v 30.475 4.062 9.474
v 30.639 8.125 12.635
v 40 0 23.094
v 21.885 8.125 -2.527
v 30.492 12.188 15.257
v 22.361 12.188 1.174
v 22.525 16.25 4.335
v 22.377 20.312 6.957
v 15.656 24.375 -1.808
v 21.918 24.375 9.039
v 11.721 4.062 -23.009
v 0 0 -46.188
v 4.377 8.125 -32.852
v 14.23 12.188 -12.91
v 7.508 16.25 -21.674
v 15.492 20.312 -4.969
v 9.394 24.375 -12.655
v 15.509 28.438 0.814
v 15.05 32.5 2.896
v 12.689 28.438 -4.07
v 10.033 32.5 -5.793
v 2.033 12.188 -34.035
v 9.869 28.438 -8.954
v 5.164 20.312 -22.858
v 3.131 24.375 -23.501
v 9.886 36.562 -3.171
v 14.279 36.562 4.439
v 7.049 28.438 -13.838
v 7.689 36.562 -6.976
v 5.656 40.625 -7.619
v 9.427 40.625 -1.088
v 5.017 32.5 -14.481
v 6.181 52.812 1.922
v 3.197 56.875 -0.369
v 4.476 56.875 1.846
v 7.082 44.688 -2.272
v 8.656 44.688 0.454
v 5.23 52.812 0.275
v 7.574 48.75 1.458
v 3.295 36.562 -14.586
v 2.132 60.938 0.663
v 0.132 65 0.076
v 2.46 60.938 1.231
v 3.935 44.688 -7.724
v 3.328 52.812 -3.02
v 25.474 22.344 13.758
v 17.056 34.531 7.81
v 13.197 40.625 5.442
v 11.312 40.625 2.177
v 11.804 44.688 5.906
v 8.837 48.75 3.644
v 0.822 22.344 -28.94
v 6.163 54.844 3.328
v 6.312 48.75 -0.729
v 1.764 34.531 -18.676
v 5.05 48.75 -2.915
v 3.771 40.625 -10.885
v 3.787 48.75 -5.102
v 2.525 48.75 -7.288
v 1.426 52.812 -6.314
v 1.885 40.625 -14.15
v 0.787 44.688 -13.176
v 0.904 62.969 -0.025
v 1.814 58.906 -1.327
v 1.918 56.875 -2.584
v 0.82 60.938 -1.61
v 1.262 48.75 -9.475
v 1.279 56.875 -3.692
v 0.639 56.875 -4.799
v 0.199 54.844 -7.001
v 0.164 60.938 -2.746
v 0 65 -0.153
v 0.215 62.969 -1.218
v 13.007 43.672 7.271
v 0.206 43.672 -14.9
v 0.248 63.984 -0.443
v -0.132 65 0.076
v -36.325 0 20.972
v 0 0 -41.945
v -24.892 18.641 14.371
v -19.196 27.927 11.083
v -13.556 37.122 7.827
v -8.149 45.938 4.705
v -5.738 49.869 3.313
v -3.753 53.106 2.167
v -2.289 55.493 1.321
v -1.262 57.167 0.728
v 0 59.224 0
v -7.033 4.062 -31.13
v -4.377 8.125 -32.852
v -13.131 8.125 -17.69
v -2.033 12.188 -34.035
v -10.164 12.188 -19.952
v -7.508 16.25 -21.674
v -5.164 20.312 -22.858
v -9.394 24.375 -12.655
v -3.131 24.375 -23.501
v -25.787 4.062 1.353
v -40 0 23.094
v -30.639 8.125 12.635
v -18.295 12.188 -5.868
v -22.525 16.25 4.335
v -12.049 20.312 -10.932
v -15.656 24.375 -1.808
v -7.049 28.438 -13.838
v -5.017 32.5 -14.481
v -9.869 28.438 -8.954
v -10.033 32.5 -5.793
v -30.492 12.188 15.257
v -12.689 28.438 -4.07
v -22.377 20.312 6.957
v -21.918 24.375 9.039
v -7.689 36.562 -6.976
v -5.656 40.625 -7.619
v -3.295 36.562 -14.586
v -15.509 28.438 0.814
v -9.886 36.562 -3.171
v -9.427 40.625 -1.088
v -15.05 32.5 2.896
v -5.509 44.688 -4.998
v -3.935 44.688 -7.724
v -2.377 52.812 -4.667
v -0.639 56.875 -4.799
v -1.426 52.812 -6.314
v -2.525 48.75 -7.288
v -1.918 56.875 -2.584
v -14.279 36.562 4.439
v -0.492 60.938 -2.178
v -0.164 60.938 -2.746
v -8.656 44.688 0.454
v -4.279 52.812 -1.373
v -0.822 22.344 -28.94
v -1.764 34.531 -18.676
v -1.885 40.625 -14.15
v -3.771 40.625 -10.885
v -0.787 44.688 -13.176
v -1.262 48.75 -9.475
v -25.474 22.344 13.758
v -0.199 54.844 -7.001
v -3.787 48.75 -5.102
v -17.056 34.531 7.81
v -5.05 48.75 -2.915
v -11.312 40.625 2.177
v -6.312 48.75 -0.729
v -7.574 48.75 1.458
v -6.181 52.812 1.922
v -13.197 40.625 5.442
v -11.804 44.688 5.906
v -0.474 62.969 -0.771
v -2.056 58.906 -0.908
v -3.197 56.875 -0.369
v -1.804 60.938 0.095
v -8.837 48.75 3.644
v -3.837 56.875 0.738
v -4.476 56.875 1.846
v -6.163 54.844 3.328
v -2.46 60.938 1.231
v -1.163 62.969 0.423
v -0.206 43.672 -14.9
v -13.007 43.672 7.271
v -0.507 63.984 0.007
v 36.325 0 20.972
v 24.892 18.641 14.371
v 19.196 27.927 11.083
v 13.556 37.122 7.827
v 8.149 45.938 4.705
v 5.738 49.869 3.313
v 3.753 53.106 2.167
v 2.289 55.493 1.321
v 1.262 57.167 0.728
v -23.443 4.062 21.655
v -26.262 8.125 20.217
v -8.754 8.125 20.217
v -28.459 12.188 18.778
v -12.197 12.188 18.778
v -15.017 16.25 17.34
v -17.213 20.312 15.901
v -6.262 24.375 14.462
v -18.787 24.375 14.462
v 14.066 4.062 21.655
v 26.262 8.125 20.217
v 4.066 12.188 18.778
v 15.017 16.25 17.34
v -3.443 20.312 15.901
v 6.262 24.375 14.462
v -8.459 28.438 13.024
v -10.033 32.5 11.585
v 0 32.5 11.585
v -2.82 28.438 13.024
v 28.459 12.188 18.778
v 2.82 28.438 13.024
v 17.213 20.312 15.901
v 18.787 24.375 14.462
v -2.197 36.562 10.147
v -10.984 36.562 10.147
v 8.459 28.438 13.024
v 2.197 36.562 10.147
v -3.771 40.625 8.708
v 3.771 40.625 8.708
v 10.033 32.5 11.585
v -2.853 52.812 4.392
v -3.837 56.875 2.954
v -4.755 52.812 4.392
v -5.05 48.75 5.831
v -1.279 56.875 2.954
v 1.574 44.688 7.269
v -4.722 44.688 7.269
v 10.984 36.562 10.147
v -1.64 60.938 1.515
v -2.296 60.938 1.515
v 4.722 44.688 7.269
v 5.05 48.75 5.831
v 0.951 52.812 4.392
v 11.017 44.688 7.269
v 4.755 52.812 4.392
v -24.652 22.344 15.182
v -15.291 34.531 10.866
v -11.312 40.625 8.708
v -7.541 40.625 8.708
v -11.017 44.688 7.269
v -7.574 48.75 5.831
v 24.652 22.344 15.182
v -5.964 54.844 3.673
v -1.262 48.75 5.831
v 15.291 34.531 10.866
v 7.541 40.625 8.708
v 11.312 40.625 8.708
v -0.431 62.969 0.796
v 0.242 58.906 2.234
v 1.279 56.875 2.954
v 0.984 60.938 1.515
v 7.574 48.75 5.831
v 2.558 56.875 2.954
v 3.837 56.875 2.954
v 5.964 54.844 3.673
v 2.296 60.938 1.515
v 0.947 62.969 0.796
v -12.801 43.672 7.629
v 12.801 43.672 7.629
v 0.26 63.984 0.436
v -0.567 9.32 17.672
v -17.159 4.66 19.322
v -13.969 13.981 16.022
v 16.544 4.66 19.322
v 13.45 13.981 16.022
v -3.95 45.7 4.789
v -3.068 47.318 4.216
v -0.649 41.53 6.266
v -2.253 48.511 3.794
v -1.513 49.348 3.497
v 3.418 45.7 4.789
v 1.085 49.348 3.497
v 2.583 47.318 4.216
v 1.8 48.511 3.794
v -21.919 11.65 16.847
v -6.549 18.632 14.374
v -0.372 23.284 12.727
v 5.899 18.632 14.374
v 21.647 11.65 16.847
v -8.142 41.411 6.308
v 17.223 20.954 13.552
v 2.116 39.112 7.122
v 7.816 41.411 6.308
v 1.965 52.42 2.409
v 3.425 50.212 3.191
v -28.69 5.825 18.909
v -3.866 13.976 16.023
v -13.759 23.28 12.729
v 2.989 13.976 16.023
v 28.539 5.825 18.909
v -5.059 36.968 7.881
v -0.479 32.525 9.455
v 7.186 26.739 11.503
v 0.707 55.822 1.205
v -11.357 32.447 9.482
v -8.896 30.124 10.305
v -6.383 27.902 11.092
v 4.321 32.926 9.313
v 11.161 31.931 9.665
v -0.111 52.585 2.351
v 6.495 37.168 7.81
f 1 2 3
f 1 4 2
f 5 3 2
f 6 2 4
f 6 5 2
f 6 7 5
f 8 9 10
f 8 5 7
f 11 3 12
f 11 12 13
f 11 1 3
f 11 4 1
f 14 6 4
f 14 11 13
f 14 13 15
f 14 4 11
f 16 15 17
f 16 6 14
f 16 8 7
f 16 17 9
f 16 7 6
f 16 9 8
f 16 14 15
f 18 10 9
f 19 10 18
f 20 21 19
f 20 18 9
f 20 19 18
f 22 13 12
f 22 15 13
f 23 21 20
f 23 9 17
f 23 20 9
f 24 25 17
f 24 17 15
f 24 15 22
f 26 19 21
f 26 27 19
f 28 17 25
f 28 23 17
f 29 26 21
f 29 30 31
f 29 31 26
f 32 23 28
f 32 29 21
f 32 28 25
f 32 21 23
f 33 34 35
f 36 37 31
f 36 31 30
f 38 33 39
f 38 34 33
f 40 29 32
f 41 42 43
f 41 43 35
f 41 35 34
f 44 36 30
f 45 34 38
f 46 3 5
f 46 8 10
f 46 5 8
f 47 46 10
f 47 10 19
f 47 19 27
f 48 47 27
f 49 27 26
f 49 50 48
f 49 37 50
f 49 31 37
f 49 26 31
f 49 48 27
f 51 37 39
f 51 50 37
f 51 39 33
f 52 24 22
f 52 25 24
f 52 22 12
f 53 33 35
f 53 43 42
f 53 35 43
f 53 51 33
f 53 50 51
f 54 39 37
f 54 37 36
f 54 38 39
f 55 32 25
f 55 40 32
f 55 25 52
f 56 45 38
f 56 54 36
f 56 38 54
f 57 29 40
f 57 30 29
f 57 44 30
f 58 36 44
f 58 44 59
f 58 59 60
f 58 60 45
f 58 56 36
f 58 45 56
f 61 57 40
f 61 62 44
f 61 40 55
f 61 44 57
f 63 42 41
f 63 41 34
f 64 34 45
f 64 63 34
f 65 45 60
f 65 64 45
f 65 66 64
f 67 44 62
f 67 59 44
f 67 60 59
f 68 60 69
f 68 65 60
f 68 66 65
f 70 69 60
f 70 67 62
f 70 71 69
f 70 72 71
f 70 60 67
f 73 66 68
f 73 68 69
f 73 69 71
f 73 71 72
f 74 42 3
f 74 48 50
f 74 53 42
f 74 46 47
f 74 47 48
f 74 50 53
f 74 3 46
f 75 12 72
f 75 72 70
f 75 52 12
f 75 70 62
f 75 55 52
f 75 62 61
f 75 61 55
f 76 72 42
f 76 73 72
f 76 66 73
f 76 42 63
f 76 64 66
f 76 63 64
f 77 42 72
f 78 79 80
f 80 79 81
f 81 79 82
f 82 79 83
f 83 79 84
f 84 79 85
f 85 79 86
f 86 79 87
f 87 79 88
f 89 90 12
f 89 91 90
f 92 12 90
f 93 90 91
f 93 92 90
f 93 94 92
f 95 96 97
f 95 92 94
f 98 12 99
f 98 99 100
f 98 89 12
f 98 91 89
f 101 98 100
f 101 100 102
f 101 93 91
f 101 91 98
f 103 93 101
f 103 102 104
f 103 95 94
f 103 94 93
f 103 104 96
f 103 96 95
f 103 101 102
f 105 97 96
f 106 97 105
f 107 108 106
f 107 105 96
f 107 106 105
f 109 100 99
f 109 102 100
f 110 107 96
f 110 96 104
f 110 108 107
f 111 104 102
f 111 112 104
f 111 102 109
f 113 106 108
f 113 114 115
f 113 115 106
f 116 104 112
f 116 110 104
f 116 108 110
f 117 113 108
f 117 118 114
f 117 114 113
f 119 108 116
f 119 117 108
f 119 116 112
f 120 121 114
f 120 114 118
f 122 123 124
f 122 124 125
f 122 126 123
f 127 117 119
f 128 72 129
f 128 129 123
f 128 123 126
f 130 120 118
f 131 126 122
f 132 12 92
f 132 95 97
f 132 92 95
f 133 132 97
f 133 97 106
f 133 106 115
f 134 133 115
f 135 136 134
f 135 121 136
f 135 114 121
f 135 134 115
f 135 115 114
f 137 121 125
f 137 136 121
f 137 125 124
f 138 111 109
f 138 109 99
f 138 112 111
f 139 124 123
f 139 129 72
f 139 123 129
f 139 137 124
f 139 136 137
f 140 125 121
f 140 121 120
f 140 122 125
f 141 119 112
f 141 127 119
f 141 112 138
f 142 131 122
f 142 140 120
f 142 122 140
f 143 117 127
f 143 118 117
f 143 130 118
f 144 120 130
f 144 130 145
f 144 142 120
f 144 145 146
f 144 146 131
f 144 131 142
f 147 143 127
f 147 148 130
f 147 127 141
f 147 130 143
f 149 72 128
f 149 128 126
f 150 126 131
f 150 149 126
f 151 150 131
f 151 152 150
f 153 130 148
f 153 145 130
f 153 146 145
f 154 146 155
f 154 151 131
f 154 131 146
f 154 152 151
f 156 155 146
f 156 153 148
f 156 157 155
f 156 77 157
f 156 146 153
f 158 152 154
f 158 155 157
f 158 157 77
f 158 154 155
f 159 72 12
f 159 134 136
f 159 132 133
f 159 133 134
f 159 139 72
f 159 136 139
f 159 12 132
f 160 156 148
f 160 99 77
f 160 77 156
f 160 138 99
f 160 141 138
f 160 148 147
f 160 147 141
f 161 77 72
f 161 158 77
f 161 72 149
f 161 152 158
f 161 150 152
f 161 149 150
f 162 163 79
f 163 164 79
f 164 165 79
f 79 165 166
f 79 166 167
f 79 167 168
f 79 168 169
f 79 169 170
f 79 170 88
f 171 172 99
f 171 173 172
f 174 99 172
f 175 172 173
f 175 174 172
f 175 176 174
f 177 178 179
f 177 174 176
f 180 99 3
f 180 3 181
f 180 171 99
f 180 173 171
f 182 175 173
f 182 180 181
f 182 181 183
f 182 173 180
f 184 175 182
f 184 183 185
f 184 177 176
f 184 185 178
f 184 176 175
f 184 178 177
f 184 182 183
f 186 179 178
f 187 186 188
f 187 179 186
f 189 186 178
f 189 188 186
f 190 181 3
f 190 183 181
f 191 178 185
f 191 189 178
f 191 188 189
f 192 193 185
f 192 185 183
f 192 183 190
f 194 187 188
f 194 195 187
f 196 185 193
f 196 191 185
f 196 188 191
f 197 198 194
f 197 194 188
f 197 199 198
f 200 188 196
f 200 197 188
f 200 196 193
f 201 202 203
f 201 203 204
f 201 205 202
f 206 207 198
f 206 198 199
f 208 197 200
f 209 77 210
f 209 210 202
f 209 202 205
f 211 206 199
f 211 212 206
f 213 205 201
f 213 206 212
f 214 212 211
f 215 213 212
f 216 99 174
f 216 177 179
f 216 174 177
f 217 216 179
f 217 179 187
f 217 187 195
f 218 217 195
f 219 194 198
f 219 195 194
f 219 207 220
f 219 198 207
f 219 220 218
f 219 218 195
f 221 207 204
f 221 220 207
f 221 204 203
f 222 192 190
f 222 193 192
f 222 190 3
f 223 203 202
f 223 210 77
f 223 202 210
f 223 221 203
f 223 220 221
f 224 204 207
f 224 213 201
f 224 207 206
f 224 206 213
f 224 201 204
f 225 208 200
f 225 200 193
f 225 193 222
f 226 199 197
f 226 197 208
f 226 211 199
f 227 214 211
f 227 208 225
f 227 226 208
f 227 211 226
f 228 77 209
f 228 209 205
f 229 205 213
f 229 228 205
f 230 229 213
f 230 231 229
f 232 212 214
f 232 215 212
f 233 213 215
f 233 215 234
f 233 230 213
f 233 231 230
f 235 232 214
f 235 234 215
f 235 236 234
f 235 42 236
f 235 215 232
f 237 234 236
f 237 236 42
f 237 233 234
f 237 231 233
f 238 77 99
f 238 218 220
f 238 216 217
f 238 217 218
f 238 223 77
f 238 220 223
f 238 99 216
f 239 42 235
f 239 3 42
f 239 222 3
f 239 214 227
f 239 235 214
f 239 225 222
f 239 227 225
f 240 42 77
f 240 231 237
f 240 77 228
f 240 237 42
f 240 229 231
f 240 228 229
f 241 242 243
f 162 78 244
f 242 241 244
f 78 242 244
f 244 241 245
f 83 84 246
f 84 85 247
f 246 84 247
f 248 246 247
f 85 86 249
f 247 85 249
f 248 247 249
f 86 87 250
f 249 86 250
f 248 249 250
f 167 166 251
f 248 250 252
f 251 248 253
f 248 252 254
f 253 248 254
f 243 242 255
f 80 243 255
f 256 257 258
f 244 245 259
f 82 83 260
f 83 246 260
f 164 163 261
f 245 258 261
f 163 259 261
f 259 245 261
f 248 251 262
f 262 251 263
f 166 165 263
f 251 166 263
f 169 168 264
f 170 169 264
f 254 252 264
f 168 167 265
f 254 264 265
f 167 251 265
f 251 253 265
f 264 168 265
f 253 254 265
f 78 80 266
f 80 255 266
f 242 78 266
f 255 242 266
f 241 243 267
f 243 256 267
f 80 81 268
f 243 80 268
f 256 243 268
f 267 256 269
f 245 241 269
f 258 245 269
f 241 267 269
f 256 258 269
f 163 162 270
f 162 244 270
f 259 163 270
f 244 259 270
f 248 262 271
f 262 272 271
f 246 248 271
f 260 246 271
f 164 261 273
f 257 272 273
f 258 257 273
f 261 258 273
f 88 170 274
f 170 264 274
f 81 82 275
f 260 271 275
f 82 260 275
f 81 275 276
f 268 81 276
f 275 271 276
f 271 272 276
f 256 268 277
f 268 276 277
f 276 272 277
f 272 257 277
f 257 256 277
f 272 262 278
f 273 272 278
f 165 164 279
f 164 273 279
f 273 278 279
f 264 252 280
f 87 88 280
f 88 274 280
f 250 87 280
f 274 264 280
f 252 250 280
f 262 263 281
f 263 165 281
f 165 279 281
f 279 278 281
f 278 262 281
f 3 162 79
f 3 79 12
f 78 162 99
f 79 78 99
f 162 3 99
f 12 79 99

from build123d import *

# Parameters (mm, degrees)
BOSS_EXTRUDE1_DEPTH = 65
BOSS_EXTRUDE1_TAPER = 19.5
SHELL1_T            = -2


with BuildPart() as part:
    # Sketch1 → Boss-Extrude1 (new body)
    with BuildSketch(Plane(origin=(0, 0, 0), x_dir=(1, 0, 0), z_dir=(0, 1, 0))):
        Polygon((40, -23.094010768), (0, 46.188021535), (-40, -23.094010768), align=None)
    extrude(amount=BOSS_EXTRUDE1_DEPTH, taper=BOSS_EXTRUDE1_TAPER)

    # Shell1
    shell1_openings = [part.faces().sort_by_distance(p)[0] for p in [
        (0, 0, 0),
    ]]
    offset(amount=SHELL1_T, openings=shell1_openings)


solid = part.part
